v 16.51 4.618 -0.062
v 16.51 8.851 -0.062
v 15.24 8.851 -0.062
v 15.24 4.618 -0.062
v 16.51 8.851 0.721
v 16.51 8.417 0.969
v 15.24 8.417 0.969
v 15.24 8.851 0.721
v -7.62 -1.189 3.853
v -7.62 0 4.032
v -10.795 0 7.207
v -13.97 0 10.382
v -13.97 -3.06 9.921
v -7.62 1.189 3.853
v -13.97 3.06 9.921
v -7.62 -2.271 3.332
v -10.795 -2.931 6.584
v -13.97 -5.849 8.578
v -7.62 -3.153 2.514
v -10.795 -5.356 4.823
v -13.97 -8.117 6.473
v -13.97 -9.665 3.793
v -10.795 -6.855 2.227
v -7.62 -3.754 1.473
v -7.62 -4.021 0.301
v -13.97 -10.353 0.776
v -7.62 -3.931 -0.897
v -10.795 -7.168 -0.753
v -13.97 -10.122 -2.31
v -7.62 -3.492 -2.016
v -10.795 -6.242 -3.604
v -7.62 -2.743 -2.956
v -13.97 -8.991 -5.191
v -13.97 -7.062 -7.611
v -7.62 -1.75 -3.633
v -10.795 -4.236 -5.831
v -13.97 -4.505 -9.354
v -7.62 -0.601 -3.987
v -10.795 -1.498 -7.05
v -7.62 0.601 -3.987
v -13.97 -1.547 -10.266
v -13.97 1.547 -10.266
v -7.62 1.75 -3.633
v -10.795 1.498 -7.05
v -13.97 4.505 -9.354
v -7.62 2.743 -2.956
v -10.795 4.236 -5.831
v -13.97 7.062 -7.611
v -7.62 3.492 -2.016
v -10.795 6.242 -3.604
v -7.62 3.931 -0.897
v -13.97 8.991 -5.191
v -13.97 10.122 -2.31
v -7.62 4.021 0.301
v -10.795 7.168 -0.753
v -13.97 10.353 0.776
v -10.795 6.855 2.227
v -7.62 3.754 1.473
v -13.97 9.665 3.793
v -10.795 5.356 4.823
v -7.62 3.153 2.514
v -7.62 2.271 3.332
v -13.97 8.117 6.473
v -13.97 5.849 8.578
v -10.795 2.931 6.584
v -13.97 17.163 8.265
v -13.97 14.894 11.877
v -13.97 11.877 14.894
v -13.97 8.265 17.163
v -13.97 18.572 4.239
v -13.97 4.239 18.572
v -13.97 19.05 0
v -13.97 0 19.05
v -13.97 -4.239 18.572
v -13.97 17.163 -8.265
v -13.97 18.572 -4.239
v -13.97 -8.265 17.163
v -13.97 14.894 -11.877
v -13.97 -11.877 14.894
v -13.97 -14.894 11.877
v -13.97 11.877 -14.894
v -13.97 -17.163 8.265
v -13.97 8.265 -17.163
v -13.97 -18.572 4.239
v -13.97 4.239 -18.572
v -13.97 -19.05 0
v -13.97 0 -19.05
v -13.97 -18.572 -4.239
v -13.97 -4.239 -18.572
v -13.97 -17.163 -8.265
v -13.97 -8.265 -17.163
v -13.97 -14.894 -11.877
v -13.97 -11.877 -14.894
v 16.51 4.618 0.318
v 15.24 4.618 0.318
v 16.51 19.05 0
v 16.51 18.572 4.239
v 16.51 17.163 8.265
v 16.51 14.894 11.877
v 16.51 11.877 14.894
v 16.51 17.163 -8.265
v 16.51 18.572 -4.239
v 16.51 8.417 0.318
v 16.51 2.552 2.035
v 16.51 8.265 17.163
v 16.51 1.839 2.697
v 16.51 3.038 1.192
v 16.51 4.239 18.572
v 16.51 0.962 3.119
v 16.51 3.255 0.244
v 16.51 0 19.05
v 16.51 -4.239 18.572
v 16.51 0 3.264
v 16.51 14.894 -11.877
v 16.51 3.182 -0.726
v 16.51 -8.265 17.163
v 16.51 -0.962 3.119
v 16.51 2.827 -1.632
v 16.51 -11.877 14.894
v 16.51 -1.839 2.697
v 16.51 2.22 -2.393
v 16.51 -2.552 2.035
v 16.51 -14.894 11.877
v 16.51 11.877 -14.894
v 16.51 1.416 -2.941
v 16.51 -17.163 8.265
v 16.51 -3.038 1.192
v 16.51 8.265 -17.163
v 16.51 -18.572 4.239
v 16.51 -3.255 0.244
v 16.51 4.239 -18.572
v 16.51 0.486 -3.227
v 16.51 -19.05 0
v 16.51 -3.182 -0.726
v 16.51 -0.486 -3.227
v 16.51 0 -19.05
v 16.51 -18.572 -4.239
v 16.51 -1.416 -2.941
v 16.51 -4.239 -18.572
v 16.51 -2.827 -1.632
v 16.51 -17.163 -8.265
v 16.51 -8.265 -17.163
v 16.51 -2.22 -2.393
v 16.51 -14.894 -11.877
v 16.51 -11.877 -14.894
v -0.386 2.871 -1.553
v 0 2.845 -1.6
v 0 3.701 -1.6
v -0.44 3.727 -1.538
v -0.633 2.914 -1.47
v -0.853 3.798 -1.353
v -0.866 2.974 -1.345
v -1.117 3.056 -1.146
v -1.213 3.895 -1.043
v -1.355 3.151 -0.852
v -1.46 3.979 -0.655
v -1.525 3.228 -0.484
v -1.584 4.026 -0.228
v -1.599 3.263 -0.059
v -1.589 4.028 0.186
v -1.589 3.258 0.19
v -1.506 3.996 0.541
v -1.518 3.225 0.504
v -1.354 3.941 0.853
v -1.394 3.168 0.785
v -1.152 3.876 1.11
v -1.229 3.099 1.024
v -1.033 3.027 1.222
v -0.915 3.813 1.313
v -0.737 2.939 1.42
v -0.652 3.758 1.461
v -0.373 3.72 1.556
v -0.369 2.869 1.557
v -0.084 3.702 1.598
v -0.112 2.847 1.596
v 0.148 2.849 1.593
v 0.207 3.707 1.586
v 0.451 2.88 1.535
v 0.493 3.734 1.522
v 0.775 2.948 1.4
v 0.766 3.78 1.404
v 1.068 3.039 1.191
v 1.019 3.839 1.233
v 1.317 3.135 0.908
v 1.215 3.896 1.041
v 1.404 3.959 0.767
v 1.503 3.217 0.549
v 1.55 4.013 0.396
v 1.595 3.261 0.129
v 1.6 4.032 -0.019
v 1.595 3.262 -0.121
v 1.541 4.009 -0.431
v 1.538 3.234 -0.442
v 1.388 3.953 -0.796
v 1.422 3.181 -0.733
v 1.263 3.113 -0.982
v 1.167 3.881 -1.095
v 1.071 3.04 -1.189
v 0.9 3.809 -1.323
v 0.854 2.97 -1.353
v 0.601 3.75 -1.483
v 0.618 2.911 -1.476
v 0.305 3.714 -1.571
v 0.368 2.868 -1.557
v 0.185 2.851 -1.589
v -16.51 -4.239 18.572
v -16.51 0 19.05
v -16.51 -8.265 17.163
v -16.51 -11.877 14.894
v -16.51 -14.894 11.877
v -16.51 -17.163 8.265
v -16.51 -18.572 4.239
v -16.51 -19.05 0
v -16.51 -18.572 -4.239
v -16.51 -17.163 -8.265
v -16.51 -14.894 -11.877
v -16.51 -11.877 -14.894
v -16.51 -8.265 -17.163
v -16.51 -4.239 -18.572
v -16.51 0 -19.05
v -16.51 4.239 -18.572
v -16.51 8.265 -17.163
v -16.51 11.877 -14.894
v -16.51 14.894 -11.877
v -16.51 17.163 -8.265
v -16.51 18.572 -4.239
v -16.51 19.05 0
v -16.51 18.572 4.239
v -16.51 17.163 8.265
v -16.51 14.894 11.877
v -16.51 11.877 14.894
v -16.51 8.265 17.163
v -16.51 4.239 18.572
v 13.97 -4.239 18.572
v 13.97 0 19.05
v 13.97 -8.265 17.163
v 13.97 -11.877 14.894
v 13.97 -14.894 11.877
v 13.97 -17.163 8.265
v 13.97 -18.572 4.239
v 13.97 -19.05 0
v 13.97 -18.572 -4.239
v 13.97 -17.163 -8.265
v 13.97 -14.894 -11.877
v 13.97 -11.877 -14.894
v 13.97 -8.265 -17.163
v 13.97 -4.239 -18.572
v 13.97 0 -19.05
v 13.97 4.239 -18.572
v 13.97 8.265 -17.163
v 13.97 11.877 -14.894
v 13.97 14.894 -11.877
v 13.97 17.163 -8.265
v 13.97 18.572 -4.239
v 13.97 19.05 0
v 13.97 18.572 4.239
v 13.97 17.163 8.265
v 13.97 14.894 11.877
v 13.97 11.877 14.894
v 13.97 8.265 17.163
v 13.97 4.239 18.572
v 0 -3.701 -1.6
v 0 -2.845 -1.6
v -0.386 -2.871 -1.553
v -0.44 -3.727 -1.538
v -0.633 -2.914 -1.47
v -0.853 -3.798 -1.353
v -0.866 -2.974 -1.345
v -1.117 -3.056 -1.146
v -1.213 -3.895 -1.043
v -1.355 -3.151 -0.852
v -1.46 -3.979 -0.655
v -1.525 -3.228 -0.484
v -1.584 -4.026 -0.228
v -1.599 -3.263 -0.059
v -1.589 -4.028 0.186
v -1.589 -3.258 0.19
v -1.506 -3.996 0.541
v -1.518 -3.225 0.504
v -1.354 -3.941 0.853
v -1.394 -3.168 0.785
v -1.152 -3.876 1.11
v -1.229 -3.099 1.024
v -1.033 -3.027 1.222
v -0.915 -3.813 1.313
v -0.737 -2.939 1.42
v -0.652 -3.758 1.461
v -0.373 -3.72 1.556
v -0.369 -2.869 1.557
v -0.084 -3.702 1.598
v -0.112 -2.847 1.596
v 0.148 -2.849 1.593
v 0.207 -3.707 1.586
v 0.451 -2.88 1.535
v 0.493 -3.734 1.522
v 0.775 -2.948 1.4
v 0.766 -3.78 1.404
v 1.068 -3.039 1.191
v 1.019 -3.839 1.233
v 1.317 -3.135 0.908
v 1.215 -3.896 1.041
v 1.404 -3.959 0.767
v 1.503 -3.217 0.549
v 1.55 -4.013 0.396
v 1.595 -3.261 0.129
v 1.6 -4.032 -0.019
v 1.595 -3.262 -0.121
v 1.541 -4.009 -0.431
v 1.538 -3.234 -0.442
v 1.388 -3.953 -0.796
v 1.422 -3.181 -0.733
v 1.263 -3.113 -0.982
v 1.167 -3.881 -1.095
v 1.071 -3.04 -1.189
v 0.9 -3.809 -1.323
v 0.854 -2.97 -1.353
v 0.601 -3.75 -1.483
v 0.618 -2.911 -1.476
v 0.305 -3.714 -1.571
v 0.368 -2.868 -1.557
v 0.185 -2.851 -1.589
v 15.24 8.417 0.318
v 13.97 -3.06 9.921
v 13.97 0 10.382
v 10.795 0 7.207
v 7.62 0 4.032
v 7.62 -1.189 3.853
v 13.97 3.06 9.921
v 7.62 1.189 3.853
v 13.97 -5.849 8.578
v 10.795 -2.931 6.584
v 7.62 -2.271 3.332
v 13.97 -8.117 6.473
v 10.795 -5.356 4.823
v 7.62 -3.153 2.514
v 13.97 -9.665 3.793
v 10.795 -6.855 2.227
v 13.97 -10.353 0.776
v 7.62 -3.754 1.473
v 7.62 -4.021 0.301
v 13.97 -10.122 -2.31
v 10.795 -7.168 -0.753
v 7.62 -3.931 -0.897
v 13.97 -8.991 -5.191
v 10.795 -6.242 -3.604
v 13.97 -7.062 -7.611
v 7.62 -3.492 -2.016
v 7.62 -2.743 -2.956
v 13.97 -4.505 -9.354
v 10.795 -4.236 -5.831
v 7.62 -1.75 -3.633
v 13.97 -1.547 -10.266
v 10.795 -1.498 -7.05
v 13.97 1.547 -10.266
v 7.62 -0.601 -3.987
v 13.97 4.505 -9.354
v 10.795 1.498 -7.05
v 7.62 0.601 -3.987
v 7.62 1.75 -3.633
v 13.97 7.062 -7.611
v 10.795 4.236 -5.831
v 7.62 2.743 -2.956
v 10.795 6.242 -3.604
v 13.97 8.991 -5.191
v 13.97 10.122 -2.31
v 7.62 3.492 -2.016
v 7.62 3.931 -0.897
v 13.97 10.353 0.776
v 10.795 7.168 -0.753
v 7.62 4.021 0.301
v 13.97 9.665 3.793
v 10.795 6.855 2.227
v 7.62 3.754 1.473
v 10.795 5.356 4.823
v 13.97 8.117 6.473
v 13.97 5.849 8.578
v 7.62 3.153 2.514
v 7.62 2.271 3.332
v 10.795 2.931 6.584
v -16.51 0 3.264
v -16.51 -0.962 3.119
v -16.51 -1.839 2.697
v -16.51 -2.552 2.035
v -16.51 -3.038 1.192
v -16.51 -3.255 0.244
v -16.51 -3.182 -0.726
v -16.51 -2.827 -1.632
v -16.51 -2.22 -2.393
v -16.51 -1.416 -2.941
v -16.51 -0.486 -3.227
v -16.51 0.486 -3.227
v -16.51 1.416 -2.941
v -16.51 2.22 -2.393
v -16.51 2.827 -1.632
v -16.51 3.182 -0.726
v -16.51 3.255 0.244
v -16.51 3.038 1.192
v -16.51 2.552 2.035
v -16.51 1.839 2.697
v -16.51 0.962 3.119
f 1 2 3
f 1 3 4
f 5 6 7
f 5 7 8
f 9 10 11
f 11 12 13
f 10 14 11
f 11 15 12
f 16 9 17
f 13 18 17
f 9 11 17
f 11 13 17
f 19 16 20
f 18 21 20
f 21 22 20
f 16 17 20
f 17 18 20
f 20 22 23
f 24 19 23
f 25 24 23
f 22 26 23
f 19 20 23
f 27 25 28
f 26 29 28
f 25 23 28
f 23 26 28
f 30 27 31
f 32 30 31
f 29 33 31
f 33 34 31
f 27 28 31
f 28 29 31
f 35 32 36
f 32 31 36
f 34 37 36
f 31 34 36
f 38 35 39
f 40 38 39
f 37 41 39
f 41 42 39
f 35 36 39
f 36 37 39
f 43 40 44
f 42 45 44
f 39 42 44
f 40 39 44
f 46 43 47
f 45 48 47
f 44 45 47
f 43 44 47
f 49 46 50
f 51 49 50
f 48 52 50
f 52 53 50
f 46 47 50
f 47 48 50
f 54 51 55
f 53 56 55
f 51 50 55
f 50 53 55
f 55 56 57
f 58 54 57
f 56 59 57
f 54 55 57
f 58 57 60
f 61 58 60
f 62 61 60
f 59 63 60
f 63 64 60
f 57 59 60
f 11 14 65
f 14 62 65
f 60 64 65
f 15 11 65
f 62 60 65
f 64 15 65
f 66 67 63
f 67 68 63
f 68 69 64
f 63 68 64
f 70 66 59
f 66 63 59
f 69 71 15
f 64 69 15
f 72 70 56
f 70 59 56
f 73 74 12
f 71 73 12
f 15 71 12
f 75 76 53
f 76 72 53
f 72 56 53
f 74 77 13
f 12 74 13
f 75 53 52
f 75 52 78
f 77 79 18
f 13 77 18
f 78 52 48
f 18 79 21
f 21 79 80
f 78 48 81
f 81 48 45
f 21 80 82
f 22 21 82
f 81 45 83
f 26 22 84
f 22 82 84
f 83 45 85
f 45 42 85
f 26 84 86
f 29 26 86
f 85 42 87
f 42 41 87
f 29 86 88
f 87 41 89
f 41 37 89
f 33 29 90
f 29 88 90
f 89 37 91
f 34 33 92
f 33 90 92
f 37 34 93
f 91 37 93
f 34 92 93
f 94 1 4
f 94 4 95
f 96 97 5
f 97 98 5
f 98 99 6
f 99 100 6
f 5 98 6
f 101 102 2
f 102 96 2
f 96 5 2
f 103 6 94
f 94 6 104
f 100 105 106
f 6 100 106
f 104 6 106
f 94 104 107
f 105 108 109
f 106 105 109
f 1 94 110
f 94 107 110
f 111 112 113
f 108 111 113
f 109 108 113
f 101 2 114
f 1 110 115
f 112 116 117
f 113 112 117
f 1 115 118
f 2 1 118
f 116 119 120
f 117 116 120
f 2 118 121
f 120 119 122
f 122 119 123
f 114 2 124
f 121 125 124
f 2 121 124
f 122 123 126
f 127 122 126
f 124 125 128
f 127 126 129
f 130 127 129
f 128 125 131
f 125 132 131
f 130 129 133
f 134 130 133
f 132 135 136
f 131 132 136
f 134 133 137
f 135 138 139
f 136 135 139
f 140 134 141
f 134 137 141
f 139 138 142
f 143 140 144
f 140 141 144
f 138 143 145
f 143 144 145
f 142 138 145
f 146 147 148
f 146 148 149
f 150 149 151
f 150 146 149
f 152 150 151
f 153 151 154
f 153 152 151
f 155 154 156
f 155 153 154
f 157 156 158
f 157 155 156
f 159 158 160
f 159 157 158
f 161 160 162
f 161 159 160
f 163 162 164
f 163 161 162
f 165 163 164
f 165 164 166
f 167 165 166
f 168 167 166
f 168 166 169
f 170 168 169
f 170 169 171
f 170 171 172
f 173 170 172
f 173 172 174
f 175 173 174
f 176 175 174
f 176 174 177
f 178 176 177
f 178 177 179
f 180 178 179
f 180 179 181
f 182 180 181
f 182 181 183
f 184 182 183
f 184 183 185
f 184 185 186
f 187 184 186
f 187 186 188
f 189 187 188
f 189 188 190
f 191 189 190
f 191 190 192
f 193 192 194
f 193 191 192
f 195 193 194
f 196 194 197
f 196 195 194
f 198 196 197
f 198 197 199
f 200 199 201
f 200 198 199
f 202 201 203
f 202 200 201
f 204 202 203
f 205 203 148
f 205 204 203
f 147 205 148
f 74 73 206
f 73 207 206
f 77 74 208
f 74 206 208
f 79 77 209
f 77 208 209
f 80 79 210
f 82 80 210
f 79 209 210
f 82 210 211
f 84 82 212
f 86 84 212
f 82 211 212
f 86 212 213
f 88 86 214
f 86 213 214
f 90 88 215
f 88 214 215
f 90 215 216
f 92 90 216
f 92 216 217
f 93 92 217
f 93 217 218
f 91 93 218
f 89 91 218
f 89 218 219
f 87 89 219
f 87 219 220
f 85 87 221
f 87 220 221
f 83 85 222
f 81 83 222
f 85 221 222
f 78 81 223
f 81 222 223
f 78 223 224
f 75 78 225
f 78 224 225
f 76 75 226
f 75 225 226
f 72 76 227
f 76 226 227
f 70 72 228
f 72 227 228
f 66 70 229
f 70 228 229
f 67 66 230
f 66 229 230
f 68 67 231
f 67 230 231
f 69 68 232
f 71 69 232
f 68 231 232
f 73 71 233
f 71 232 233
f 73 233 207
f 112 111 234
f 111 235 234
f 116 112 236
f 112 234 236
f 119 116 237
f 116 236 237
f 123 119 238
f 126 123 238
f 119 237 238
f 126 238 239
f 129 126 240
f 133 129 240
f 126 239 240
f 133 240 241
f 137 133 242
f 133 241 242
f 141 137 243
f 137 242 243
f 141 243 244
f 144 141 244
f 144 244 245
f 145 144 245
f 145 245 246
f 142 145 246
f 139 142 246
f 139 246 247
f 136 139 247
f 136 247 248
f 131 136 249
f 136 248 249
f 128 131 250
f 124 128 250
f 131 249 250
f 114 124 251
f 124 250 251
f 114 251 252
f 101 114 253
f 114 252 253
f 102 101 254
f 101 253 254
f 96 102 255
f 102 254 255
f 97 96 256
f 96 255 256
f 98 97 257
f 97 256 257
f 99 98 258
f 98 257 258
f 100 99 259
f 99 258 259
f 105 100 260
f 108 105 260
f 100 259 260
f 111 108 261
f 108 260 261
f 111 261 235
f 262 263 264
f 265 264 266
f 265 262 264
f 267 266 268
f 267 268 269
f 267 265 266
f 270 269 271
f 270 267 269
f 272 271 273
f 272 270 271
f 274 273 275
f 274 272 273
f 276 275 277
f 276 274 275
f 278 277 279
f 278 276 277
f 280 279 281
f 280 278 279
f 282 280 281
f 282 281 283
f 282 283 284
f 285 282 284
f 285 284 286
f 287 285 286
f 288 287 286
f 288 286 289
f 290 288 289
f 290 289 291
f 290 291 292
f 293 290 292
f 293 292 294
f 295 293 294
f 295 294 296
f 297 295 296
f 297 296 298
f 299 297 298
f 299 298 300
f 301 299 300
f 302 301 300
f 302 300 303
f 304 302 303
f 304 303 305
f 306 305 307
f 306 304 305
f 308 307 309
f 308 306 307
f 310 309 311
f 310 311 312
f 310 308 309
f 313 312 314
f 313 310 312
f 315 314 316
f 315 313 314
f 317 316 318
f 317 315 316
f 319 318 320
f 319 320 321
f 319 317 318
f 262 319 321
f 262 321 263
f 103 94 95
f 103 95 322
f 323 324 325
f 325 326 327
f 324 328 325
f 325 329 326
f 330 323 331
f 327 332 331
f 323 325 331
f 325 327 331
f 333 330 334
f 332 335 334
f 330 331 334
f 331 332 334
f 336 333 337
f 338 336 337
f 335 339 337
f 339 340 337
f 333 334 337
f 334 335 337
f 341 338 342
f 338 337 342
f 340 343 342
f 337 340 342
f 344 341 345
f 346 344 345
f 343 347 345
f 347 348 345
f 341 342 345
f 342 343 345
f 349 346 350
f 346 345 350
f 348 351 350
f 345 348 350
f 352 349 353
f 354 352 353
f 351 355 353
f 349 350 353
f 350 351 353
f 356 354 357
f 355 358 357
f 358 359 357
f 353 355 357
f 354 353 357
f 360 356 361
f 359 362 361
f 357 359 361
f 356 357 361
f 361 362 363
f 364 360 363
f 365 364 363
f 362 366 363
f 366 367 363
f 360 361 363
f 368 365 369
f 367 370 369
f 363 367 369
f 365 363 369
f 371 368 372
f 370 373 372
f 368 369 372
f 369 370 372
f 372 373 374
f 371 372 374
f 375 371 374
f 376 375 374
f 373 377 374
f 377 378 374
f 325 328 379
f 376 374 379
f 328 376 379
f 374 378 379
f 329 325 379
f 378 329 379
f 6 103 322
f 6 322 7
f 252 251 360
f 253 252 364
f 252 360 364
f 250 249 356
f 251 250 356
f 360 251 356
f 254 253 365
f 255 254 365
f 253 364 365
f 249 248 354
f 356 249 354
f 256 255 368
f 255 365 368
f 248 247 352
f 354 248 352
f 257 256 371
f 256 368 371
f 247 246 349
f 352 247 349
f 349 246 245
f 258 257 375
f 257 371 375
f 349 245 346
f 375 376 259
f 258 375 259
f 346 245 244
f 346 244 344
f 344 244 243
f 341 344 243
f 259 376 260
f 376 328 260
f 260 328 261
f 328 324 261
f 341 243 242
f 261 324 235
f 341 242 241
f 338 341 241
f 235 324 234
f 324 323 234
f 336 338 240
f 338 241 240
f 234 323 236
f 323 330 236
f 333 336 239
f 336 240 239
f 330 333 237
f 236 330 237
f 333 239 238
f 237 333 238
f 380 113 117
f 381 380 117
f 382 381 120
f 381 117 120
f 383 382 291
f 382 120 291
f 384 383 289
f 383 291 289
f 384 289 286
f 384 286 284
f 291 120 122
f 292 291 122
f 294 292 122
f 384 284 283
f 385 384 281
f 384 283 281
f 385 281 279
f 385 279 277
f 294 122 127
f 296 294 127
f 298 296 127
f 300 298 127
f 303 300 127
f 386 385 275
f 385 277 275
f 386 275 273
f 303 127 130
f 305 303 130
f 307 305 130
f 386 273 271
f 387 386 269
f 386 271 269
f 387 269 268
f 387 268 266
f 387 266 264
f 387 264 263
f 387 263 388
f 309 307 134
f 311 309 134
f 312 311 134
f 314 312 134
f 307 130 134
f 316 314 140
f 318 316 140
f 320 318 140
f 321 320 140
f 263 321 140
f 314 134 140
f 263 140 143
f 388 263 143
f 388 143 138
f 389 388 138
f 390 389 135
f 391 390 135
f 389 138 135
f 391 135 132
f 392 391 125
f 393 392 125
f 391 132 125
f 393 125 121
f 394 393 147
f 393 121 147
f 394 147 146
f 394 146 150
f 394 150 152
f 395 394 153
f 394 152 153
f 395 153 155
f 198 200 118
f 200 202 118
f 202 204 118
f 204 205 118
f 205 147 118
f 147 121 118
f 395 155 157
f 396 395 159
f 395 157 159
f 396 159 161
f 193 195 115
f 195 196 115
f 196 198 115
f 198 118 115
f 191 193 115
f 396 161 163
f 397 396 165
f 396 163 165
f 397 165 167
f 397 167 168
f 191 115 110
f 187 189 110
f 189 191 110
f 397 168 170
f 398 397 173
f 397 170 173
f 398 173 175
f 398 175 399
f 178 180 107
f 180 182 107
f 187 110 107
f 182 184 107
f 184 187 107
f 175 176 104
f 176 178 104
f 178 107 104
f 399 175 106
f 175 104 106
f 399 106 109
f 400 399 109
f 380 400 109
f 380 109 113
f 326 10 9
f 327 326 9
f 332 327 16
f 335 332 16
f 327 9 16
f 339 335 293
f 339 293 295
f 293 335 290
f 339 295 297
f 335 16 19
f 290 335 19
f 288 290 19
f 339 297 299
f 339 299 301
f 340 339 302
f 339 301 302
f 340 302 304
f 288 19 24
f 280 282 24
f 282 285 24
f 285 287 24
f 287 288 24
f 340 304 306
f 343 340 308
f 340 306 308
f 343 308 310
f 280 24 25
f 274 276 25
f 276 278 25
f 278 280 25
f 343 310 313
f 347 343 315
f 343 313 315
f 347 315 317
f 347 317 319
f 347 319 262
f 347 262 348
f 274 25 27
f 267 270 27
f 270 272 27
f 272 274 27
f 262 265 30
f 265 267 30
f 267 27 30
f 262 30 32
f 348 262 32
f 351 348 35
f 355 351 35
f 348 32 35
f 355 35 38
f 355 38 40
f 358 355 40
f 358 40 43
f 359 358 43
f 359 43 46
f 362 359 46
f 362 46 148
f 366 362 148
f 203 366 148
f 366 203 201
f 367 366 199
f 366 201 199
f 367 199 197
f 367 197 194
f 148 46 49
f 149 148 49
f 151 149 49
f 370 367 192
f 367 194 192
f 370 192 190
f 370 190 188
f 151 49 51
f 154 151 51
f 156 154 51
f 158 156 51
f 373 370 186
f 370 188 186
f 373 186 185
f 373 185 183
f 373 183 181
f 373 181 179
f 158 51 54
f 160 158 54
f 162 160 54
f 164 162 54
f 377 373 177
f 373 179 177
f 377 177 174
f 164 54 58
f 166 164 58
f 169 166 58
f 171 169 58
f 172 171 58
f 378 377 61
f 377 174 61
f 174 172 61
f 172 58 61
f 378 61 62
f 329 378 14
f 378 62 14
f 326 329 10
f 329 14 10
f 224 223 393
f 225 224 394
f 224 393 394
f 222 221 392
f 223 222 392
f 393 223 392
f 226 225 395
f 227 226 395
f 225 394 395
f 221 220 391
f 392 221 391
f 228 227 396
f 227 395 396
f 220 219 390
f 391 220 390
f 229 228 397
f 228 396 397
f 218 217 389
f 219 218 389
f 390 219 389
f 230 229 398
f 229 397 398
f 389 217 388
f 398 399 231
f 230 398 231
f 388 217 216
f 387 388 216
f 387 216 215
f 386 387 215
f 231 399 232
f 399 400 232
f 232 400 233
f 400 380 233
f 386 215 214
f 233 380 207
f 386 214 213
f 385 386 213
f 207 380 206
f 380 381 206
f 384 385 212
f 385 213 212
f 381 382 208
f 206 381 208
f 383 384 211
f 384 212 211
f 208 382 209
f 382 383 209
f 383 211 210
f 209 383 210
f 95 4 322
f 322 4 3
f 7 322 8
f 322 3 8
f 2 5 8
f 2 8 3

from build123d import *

# Parameters (mm, degrees)
CUT_EXTRUDE1_DEPTH      = 32.597232474
CUT_EXTRUDE1_DEPTH_BACK = 32.597232474
SKETCH2_R               = 1.6
CHAMFER1_SIZE           = 6.35
CUT_EXTRUDE2_DEPTH      = 1.27


with BuildPart() as part:
    # Sketch1 → Revolve1 (revolve)
    with BuildSketch(Plane.XY):
        Polygon((16.51, 3.2639), (16.51, 19.05), (13.97, 19.05), (13.97, 4.03225), (-13.97, 4.03225), (-13.97, 19.05), (-16.51, 19.05), (-16.51, 3.2639), align=None)
    revolve(axis=Axis((-15.275524476, 0, 0), (1, 0, 0)))

    # Sketch2 → Cut-Extrude1 (cut, two sides: drawn at the far end of the back side and taken through both)
    with BuildSketch(Plane(origin=(0, 0, 0), x_dir=(1, 0, 0), z_dir=(0, 1, 0)).offset(-CUT_EXTRUDE1_DEPTH_BACK)):
        Circle(SKETCH2_R)
    extrude(amount=CUT_EXTRUDE1_DEPTH + CUT_EXTRUDE1_DEPTH_BACK, mode=Mode.SUBTRACT)

    # Chamfer1
    chamfer1_edges = [part.edges().sort_by_distance(p)[0] for p in [
        (13.97, -4.03225, 0),
        (-13.97, -4.03225, 0),
    ]]
    chamfer(chamfer1_edges, length=CHAMFER1_SIZE)

    # Sketch3 → Cut-Extrude2 (cut)
    with BuildSketch(Plane(origin=(16.51, 0, 0), x_dir=(0, 0, -1), z_dir=(1, 0, 0))):
        Polygon((-0.720758245, 8.851363919), (0.061967449, 8.851363919), (0.061967449, 4.618030586), (-0.317947081, 4.618030586), (-0.317947081, 8.417175885), (-0.969229132, 8.417175885), align=None)
    extrude(amount=-CUT_EXTRUDE2_DEPTH, mode=Mode.SUBTRACT)


solid = part.part
